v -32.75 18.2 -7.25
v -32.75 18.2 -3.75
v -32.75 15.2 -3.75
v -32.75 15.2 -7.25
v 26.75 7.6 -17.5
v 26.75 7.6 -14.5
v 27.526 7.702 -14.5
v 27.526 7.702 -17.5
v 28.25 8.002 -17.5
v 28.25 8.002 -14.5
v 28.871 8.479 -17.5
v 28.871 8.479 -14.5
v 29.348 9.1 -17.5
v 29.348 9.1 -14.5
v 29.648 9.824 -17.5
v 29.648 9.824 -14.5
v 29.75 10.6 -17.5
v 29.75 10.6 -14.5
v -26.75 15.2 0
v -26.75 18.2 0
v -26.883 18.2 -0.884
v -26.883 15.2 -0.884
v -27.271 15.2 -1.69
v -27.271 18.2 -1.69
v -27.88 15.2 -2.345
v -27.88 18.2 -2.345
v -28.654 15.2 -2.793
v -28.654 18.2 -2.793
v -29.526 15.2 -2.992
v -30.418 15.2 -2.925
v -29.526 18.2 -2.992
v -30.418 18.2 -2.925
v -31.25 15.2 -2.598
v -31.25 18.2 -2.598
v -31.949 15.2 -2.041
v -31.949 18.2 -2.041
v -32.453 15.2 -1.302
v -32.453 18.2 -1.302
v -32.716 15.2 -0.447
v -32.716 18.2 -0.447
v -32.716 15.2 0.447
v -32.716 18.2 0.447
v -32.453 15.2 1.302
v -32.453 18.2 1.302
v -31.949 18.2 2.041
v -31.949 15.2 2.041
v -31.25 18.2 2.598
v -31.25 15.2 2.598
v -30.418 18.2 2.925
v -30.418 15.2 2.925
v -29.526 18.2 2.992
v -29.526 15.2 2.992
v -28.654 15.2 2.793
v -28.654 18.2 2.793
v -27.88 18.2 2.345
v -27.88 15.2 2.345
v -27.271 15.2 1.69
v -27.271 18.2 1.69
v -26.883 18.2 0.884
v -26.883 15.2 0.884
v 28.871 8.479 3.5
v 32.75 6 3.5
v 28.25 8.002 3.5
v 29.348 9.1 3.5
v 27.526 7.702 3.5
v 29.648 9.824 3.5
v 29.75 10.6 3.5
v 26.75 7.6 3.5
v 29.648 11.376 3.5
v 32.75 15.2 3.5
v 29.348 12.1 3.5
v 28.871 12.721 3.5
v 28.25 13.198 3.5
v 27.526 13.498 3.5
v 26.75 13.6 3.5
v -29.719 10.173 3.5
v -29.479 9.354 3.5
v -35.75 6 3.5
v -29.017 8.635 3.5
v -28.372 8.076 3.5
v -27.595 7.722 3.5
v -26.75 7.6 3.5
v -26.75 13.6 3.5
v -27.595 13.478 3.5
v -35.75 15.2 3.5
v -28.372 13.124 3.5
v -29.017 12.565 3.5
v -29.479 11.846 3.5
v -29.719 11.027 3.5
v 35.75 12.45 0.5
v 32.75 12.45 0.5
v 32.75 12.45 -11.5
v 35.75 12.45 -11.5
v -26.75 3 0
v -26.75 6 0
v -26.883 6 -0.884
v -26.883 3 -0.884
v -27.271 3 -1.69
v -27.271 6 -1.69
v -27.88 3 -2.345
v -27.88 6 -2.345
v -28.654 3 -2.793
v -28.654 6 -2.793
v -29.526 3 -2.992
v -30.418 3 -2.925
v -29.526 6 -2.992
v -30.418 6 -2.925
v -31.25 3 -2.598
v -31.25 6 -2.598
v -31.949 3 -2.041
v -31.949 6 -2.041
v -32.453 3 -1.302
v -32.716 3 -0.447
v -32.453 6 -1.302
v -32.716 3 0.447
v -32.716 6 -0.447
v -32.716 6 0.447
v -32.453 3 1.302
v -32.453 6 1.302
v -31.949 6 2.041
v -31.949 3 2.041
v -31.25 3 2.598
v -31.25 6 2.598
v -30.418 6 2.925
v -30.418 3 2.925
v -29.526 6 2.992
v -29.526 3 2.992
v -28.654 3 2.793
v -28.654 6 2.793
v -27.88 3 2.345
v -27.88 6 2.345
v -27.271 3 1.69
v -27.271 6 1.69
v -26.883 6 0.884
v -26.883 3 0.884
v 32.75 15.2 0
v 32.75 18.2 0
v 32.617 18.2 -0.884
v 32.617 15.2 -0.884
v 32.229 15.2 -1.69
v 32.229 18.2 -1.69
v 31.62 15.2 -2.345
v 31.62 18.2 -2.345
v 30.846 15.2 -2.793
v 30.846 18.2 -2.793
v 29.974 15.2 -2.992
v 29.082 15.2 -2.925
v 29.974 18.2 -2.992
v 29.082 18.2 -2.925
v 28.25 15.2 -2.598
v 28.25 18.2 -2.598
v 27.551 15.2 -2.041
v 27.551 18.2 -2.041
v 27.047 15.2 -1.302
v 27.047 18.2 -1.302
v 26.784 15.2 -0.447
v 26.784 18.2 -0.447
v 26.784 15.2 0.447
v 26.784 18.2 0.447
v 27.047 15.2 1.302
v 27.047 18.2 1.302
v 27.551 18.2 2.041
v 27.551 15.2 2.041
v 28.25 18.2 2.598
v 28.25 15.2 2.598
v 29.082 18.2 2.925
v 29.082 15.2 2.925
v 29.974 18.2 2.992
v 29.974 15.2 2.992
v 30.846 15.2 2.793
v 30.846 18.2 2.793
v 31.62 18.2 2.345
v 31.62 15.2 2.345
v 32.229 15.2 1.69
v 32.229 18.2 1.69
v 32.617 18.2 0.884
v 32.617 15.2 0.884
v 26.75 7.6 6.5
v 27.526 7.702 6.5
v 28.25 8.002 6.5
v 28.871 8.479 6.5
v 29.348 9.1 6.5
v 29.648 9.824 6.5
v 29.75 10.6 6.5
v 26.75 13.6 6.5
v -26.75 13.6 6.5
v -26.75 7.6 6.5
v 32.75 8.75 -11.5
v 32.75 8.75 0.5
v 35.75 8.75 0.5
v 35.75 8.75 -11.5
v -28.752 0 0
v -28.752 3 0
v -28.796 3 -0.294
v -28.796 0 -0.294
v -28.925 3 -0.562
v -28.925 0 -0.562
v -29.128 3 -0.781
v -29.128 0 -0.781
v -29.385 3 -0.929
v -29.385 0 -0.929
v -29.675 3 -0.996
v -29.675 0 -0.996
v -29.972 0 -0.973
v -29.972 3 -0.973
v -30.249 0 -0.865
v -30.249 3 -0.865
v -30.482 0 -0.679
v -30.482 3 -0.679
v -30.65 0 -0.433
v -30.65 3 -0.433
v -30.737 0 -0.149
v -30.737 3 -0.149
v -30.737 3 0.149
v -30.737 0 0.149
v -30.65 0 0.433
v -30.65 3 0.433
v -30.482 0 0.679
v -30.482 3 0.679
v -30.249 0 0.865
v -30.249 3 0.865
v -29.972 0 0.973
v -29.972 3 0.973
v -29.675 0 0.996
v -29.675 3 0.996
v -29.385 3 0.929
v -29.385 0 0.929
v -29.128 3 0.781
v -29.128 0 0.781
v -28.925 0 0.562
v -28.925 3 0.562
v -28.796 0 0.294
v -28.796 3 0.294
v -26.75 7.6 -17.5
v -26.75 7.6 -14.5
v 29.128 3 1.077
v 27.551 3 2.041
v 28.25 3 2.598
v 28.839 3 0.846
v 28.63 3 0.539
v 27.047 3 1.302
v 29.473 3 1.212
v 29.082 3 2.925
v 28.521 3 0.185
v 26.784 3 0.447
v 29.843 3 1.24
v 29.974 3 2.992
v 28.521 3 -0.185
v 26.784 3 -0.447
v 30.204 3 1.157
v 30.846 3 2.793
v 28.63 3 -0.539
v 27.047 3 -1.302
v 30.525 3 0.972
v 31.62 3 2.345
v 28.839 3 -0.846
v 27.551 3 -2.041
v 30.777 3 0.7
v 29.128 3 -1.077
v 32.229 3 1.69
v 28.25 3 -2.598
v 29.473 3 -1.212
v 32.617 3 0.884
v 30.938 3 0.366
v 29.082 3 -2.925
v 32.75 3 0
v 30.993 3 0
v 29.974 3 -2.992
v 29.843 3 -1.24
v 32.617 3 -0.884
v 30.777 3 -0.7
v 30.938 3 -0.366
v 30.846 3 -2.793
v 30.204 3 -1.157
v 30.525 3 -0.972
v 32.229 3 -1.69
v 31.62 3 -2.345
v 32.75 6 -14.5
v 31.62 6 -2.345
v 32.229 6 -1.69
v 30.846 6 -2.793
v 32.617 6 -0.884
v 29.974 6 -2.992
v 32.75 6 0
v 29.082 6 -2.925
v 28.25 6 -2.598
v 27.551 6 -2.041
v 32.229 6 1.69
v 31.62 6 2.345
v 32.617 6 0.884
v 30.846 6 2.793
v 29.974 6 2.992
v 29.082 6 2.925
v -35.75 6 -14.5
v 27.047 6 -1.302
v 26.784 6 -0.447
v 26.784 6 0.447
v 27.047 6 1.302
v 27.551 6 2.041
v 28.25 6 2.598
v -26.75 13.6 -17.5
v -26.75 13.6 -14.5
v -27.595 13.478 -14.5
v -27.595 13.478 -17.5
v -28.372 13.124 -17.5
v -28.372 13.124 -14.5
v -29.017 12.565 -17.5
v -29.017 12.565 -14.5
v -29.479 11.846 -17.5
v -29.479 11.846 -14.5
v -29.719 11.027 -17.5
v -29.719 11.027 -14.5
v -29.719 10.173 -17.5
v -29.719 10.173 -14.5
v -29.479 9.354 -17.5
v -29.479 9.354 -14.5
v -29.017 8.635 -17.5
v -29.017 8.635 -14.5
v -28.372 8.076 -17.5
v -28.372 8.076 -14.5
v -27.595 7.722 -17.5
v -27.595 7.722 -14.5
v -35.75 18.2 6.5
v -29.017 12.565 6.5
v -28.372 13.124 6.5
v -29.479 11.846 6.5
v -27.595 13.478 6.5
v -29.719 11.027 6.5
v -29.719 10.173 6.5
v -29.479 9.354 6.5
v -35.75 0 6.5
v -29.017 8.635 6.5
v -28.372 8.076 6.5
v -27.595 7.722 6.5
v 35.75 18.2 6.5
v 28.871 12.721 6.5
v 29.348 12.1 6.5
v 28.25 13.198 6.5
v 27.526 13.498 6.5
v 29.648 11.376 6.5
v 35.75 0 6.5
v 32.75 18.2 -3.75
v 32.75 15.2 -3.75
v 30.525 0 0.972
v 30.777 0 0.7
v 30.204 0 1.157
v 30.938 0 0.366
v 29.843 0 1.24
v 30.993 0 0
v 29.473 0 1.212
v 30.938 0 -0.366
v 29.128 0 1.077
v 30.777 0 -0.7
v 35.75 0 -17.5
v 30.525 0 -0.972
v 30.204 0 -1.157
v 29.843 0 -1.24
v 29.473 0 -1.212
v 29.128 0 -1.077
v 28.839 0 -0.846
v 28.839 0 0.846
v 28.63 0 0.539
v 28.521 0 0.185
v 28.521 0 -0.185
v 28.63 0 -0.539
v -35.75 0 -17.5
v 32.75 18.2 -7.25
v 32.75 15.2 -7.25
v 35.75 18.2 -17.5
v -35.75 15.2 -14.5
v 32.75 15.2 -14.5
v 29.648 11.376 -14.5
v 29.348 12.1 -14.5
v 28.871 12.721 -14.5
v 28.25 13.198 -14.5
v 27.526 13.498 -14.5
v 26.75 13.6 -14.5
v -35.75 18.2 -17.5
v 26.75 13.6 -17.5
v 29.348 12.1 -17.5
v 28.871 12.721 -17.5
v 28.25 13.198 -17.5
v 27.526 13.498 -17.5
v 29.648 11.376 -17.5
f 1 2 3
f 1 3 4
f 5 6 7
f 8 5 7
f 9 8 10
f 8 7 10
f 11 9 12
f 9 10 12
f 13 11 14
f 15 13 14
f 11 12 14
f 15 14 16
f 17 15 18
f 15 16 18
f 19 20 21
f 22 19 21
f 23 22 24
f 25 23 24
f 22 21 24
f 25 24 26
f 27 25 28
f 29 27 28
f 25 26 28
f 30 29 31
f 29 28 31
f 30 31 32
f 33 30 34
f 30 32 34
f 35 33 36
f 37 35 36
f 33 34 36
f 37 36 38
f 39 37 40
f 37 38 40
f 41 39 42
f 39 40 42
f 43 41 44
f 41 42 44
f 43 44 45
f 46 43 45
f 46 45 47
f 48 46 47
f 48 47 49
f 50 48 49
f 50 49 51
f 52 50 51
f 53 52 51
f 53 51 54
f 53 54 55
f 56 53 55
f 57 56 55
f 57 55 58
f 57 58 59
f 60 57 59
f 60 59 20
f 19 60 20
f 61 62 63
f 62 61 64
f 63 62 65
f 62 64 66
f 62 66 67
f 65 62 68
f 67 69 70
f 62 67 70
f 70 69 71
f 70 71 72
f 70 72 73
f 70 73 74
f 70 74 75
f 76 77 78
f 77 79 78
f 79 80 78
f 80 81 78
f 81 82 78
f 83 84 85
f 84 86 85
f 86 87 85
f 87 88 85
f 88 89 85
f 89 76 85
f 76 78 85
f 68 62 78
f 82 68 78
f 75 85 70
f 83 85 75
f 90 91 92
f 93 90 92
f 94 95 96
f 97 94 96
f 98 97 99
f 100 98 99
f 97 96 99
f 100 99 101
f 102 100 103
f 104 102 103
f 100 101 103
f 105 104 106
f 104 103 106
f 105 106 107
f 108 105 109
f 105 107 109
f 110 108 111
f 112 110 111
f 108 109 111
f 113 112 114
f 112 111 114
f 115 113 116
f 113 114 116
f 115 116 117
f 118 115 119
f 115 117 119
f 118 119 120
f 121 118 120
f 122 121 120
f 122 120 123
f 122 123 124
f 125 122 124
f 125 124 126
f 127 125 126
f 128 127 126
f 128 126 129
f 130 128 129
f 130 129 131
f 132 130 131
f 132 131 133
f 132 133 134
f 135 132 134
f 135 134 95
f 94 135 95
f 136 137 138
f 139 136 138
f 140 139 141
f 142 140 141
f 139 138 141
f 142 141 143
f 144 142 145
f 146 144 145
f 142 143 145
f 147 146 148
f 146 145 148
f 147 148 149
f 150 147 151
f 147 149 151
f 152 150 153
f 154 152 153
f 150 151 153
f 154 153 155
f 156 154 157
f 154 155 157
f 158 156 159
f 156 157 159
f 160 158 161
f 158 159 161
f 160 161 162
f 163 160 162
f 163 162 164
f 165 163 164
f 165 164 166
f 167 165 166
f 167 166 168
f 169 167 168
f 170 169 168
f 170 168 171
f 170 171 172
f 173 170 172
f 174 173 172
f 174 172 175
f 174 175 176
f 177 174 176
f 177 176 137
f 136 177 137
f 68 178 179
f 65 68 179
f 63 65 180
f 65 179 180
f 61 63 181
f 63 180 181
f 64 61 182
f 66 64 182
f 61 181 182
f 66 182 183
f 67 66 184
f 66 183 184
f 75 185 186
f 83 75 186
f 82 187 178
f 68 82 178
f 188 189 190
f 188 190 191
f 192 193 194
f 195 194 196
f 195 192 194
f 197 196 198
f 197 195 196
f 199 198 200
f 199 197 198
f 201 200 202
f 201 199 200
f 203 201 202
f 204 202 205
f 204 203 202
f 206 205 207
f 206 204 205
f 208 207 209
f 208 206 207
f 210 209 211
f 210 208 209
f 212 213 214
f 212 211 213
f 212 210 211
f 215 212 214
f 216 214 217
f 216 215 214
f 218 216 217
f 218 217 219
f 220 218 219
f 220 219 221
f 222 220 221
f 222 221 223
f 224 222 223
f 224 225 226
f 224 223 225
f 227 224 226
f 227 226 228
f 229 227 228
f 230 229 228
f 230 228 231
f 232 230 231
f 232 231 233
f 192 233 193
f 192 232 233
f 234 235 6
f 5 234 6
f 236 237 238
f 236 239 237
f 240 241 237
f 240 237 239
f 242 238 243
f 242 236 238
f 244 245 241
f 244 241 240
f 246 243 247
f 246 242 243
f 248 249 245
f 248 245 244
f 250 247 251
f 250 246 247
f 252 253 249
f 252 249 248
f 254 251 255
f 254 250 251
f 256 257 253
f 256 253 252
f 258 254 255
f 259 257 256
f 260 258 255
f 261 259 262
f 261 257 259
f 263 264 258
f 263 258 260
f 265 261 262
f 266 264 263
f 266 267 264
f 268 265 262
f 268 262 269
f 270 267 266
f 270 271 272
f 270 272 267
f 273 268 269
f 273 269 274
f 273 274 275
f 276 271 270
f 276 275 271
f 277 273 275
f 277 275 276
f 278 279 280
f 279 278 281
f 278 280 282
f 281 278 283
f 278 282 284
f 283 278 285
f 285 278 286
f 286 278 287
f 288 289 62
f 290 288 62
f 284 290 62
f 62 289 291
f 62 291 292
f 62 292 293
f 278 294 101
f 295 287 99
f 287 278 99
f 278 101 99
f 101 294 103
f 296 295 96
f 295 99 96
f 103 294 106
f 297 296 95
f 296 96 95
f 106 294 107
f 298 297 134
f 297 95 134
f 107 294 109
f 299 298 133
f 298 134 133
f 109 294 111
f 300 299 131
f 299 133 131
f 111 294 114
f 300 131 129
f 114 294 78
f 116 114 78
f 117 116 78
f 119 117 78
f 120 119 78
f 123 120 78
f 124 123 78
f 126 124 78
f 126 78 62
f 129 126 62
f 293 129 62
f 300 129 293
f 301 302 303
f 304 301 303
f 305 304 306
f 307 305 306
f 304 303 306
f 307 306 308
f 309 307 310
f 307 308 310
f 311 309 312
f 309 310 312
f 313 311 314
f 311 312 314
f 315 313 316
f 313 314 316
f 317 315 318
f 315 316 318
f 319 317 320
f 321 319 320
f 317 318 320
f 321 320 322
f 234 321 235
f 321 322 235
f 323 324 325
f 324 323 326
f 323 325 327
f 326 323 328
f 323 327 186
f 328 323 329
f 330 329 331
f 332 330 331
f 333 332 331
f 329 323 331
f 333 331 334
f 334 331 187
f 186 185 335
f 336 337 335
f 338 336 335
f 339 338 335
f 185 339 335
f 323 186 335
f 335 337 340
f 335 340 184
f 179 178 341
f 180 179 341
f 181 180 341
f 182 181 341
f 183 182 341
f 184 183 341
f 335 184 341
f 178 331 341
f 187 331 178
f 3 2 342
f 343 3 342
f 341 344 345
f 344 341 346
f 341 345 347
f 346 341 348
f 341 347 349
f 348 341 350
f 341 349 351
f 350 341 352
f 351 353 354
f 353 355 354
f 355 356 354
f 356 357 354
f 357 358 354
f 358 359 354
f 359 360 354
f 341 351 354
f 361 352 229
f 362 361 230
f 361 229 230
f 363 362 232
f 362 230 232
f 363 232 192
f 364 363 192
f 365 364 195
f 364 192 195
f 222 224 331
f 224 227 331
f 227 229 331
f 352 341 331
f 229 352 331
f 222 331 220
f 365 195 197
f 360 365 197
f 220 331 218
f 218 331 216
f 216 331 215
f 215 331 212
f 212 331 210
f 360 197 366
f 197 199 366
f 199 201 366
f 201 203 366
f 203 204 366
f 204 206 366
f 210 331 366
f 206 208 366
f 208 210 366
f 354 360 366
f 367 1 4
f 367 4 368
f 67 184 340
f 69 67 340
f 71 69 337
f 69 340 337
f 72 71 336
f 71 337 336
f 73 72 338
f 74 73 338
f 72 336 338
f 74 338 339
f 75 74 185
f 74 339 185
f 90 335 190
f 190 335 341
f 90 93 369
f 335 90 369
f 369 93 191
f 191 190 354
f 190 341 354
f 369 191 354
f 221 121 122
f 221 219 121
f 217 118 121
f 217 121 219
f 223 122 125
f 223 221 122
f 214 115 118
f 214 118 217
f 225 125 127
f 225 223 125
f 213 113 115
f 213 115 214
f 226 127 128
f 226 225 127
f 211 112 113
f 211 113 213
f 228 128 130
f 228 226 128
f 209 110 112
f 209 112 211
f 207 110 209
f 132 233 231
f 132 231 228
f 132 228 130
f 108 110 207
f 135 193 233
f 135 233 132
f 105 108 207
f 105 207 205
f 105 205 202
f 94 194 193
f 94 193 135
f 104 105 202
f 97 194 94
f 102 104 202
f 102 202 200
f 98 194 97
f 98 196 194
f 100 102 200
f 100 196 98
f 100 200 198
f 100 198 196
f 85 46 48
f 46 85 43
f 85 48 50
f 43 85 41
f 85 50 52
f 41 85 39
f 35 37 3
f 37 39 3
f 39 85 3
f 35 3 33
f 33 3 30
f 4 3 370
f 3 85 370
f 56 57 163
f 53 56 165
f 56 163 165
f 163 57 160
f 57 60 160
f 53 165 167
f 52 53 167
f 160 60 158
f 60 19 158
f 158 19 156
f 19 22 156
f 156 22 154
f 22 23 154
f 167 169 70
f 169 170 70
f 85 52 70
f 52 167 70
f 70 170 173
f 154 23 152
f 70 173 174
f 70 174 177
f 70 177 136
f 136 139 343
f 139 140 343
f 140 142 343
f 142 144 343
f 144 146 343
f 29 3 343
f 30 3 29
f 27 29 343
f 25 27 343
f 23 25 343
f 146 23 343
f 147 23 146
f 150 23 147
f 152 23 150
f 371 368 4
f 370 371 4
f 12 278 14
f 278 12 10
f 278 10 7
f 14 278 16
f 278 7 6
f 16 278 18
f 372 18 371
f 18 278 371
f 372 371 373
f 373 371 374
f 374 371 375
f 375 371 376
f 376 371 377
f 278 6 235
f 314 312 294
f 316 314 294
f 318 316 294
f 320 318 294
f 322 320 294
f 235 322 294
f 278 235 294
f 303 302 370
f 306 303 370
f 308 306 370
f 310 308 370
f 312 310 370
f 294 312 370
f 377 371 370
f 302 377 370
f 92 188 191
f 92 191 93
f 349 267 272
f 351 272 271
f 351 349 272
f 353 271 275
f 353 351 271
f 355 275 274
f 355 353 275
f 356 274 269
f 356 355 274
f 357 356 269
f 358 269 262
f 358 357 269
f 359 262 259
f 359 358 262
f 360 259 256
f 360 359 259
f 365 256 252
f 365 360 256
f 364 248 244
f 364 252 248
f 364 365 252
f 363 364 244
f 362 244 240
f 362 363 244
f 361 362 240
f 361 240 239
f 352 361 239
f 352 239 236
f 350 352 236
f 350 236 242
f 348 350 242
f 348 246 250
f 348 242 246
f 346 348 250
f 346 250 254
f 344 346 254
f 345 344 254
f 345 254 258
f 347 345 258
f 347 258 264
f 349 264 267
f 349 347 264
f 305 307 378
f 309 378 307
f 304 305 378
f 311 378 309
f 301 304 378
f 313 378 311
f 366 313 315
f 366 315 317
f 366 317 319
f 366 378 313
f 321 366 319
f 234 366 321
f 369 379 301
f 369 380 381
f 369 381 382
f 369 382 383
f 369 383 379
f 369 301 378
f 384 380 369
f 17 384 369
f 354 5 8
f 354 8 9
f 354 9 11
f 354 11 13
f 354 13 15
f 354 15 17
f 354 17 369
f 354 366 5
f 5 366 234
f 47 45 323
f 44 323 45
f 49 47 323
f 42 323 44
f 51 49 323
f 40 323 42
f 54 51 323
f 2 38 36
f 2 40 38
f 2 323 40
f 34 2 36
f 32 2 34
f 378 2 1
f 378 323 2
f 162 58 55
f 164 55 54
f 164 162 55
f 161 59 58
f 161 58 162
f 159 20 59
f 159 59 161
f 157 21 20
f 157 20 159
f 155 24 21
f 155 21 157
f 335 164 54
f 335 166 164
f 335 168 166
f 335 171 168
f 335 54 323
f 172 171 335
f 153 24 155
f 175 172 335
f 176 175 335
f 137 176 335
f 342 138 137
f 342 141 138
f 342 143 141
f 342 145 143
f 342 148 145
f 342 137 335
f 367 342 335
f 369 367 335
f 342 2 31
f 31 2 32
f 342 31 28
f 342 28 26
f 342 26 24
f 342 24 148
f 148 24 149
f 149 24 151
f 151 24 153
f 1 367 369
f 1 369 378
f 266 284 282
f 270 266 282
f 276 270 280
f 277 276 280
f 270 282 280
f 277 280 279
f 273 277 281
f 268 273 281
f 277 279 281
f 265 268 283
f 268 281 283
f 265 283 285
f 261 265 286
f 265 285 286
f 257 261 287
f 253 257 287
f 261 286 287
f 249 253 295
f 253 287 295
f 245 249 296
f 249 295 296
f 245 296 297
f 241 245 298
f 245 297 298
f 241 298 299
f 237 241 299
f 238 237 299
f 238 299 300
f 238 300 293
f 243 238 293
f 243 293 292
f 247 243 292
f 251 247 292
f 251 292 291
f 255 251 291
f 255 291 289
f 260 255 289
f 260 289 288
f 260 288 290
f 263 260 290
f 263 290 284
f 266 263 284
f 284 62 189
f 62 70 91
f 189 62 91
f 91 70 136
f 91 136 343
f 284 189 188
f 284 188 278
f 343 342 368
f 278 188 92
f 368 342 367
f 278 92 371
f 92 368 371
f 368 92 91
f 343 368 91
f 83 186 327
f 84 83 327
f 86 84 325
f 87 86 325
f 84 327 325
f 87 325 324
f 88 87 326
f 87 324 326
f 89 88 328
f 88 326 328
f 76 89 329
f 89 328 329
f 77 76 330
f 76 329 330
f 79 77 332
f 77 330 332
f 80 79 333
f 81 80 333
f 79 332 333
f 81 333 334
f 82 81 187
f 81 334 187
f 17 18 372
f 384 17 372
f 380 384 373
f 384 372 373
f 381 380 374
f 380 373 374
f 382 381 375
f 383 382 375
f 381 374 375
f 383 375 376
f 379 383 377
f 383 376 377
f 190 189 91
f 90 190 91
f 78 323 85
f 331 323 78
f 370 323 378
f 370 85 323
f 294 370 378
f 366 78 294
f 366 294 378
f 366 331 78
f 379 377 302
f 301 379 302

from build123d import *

# Parameters (mm, degrees)
SKETCH1_W            = 65.5
SKETCH1_H            = 9
SKETCH1_R            = 0.998395378
SKETCH1_R_2          = 1.243115981
BOSS_EXTRUDE1_DEPTH  = 6
SKETCH3_W            = 65.5
SKETCH3_H            = 6
BOSS_EXTRUDE2_DEPTH  = 10
SKETCH4_W            = 65.5
SKETCH4_H            = 6
BOSS_EXTRUDE3_DEPTH  = 2
SKETCH5_W            = 65.5
SKETCH5_H            = 3
BOSS_EXTRUDE4_DEPTH  = 9.2
SKETCH7_W            = 21
SKETCH7_H            = 15.2
BOSS_EXTRUDE6_DEPTH  = 3
SKETCH12_W           = 68.5
SKETCH12_H           = 15.2
BOSS_EXTRUDE10_DEPTH = 3
SKETCH13_W           = 24
SKETCH13_H           = 15.2
SKETCH13_W_2         = 12
SKETCH13_H_2         = 3.7
BOSS_EXTRUDE11_DEPTH = 3
CUT_EXTRUDE2_DEPTH   = 25
SKETCH11_W           = 18
SKETCH11_H           = 9.2
CUT_EXTRUDE4_DEPTH   = 3
SKETCH14_W           = 71.5
SKETCH14_H           = 24
BOSS_EXTRUDE12_DEPTH = 3
SKETCH15_W           = 65.5
SKETCH15_H           = 3.5
CUT_EXTRUDE5_DEPTH   = 3
SKETCH16_R           = 3
CUT_EXTRUDE6_DEPTH   = 15.2


with BuildPart() as part:
    # Sketch1 → Boss-Extrude1 (new body)
    with BuildSketch(Plane(origin=(0, 0, 0), x_dir=(1, 0, 0), z_dir=(0, 1, 0))):
        Rectangle(SKETCH1_W, SKETCH1_H)
        with Locations((-29.75, 0)):
            Circle(SKETCH1_R, mode=Mode.SUBTRACT)
        with Locations((29.75, 0)):
            Circle(SKETCH1_R_2, mode=Mode.SUBTRACT)
    extrude(amount=BOSS_EXTRUDE1_DEPTH)

    # Sketch3 → Boss-Extrude2 (add)
    with BuildSketch(Plane(origin=(0, 0, -4.5), x_dir=(-1, 0, 0), z_dir=(0, 0, -1))):
        with Locations((0, 3)):
            Rectangle(SKETCH3_W, SKETCH3_H)
    extrude(amount=BOSS_EXTRUDE2_DEPTH)

    # Sketch4 → Boss-Extrude3 (add)
    with BuildSketch(Plane.XY.offset(4.5)):
        with Locations((0, 3)):
            Rectangle(SKETCH4_W, SKETCH4_H)
    extrude(amount=BOSS_EXTRUDE3_DEPTH)

    # Sketch5 → Boss-Extrude4 (add)
    with BuildSketch(Plane(origin=(0, 6, 0), x_dir=(1, 0, 0), z_dir=(0, 1, 0))):
        with Locations((0, -5)):
            Rectangle(SKETCH5_W, SKETCH5_H)
    extrude(amount=BOSS_EXTRUDE4_DEPTH)

    # Sketch7 → Boss-Extrude6 (add)
    with BuildSketch(Plane.ZY.offset(32.75)):
        with Locations((-4, 7.6)):
            Rectangle(SKETCH7_W, SKETCH7_H)
    extrude(amount=BOSS_EXTRUDE6_DEPTH)

    # Sketch12 → Boss-Extrude10 (add)
    with BuildSketch(Plane(origin=(0, 0, -14.5), x_dir=(-1, 0, 0), z_dir=(0, 0, -1))):
        with Locations((1.5, 7.6)):
            Rectangle(SKETCH12_W, SKETCH12_H)
    extrude(amount=BOSS_EXTRUDE10_DEPTH)

    # Sketch13 → Boss-Extrude11 (add)
    with BuildSketch(Plane(origin=(32.75, 0, 0), x_dir=(0, 0, -1), z_dir=(1, 0, 0))):
        with Locations((5.5, 7.6)):
            Rectangle(SKETCH13_W, SKETCH13_H)
        with Locations((5.5, 10.6)):
            Rectangle(SKETCH13_W_2, SKETCH13_H_2, mode=Mode.SUBTRACT)
    extrude(amount=BOSS_EXTRUDE11_DEPTH)

    # Sketch6 → Cut-Extrude2 (cut, through all)
    with BuildSketch(Plane.XY.offset(6.5)):
        with BuildLine():
            ThreePointArc((-23.75, 10.6), (-24.628679656, 12.721320344), (-26.75, 13.6))
            Line((-26.75, 13.6), (-26.75, 7.6))
            ThreePointArc((-26.75, 7.6), (-24.628679656, 8.478679656), (-23.75, 10.6))
        make_face()
        with BuildLine():
            Line((-26.75, 7.6), (-26.75, 13.6))
            ThreePointArc((-26.75, 13.6), (-29.75, 10.6), (-26.75, 7.6))
        make_face()
        with BuildLine():
            ThreePointArc((29.75, 10.6), (28.871320344, 12.721320344), (26.75, 13.6))
            Line((26.75, 13.6), (26.75, 7.6))
            ThreePointArc((26.75, 7.6), (28.871320344, 8.478679656), (29.75, 10.6))
        make_face()
        with BuildLine():
            Line((26.75, 7.6), (26.75, 13.6))
            ThreePointArc((26.75, 13.6), (23.75, 10.6), (26.75, 7.6))
        make_face()
        with BuildLine():
            Line((26.75, 13.6), (-26.75, 13.6))
            ThreePointArc((-26.75, 13.6), (-24.628679656, 12.721320344), (-23.75, 10.6))
            ThreePointArc((-23.75, 10.6), (-24.628679656, 8.478679656), (-26.75, 7.6))
            Line((-26.75, 7.6), (26.75, 7.6))
            ThreePointArc((26.75, 7.6), (23.75, 10.6), (26.75, 13.6))
        make_face()
    extrude(amount=-CUT_EXTRUDE2_DEPTH, mode=Mode.SUBTRACT)

    # Sketch11 → Cut-Extrude4 (cut)
    with BuildSketch(Plane.ZY.offset(35.75)):
        with Locations((-5.5, 10.6)):
            Rectangle(SKETCH11_W, SKETCH11_H)
    extrude(amount=-CUT_EXTRUDE4_DEPTH, mode=Mode.SUBTRACT)

    # Sketch14 → Boss-Extrude12 (add)
    with BuildSketch(Plane(origin=(0, 15.2, 0), x_dir=(1, 0, 0), z_dir=(0, 1, 0))):
        with Locations((0, 5.5)):
            Rectangle(SKETCH14_W, SKETCH14_H)
    extrude(amount=BOSS_EXTRUDE12_DEPTH)

    # Sketch15 → Cut-Extrude5 (cut)
    with BuildSketch(Plane(origin=(0, 18.2, 0), x_dir=(1, 0, 0), z_dir=(0, 1, 0))):
        with Locations((0, 5.5)):
            Rectangle(SKETCH15_W, SKETCH15_H)
    extrude(amount=-CUT_EXTRUDE5_DEPTH, mode=Mode.SUBTRACT)

    # Sketch16 → Cut-Extrude6 (cut)
    with BuildSketch(Plane(origin=(0, 18.2, 0), x_dir=(1, 0, 0), z_dir=(0, 1, 0))):
        with Locations((-29.75, 0)):
            Circle(SKETCH16_R)
        with Locations((29.75, 0)):
            Circle(SKETCH16_R)
    extrude(amount=-CUT_EXTRUDE6_DEPTH, mode=Mode.SUBTRACT)


solid = part.part
